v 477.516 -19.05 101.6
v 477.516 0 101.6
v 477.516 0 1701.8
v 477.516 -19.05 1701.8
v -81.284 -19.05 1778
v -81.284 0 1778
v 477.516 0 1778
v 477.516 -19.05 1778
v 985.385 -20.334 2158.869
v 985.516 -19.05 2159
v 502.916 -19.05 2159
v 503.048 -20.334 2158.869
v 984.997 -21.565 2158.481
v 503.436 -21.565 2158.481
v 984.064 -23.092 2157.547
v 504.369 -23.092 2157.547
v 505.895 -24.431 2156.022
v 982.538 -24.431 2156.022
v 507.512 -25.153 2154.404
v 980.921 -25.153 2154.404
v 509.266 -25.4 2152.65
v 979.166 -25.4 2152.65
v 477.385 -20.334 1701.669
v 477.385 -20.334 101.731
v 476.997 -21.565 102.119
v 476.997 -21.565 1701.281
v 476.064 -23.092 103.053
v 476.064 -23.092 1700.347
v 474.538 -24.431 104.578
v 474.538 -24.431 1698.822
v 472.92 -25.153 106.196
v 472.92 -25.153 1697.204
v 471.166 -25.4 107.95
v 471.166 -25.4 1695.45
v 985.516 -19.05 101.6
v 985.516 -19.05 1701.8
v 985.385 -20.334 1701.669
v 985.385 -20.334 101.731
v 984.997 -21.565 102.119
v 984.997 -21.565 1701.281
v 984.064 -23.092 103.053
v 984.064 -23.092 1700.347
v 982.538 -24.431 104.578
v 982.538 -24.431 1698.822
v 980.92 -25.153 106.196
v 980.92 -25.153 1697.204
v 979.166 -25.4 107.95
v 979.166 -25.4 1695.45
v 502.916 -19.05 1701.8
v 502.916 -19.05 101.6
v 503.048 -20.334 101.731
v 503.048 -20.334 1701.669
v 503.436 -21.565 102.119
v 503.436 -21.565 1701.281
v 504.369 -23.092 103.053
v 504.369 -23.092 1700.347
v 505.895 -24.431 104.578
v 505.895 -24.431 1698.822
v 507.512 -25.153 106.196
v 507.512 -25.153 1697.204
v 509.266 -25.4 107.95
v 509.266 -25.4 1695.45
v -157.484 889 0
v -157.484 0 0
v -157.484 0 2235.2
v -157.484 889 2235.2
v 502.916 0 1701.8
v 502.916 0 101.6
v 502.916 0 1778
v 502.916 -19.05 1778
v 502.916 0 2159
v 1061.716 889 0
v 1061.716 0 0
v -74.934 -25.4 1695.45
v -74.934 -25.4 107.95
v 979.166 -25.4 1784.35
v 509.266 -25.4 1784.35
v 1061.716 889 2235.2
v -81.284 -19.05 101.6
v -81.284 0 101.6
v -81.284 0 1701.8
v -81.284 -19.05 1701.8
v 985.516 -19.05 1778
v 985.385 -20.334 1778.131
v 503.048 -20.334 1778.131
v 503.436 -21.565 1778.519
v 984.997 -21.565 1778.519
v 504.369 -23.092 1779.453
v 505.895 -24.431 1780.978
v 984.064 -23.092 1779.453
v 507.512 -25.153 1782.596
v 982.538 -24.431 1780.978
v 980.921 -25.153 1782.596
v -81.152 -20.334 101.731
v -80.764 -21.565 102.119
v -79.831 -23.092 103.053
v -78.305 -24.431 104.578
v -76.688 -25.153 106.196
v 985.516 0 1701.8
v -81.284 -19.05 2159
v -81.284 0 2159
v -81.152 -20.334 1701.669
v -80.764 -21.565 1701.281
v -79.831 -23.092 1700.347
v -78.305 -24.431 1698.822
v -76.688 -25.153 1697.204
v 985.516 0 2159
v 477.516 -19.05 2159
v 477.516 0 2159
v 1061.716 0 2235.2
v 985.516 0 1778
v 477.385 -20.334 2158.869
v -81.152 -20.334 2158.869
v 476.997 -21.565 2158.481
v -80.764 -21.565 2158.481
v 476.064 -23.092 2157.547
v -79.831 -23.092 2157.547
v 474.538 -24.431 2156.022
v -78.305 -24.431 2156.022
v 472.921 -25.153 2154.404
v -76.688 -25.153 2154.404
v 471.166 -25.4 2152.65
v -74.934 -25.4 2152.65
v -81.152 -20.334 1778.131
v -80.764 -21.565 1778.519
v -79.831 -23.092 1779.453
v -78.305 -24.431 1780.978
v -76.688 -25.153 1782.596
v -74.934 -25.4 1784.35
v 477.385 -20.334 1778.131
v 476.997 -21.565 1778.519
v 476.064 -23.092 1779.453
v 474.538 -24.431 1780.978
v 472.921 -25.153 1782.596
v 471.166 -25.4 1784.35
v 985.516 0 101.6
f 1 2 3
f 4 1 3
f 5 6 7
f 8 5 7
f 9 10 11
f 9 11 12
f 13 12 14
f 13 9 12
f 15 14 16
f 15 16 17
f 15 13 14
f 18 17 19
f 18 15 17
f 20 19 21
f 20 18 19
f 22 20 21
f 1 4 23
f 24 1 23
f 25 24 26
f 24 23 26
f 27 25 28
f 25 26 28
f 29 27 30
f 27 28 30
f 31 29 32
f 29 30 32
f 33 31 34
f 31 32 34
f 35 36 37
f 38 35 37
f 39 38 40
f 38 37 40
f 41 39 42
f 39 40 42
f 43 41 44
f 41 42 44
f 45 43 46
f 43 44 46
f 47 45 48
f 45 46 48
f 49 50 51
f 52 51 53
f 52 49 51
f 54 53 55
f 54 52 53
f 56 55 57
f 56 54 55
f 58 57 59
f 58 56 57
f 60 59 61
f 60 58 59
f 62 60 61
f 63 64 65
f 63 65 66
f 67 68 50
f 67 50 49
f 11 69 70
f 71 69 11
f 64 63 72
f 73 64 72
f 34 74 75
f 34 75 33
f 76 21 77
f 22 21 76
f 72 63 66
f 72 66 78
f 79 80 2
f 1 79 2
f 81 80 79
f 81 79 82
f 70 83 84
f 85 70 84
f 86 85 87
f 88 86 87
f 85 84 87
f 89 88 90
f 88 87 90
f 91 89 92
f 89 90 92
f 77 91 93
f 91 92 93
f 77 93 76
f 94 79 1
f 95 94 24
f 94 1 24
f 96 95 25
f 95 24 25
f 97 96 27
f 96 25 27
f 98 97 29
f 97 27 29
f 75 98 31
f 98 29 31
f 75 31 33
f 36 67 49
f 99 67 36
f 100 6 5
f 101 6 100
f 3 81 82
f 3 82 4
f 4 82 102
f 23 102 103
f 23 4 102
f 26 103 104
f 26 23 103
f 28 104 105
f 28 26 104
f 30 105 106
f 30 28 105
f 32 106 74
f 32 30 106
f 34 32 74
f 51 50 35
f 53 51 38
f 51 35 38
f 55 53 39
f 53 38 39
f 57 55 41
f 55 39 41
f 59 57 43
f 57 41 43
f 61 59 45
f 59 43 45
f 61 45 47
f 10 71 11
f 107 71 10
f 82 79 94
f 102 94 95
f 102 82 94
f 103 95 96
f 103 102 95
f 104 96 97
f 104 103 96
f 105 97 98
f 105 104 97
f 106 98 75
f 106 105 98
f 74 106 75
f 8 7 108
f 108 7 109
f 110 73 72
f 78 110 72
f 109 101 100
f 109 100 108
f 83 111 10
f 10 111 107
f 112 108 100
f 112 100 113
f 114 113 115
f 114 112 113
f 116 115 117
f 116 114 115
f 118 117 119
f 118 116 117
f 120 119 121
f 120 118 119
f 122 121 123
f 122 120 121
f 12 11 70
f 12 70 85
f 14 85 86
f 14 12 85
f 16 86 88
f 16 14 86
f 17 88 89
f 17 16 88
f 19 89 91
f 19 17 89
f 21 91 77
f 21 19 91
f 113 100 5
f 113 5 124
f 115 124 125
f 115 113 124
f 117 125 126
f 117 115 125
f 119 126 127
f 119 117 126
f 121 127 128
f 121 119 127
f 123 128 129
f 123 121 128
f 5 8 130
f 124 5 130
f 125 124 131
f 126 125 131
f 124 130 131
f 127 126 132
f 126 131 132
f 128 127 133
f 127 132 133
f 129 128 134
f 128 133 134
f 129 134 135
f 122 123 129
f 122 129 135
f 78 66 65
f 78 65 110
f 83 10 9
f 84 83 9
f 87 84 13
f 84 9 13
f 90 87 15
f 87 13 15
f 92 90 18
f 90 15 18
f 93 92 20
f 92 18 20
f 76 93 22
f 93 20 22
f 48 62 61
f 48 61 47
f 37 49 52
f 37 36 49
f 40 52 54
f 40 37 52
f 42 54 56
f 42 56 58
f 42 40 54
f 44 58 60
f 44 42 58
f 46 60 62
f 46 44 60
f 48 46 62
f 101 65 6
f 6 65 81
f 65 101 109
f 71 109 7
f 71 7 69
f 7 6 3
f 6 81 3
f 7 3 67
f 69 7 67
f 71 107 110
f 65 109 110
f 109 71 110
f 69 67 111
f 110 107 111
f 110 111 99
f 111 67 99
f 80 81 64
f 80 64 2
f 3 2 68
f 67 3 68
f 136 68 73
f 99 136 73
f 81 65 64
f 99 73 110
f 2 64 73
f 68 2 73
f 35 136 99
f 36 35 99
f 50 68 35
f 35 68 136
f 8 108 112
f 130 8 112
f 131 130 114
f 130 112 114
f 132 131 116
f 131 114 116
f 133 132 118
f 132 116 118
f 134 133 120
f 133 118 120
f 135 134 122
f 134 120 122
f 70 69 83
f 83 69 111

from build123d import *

# Parameters (mm, degrees)
F0_W     = 1219.2
F0_H     = 889
F1_DEPTH = 2235.2
F2_W     = 558.8
F2_H     = 1600.2
F2_W_2   = 482.6
F2_H_2   = 381
F3_DEPTH = 25.4
F4_R     = 6.35


with BuildPart() as f1:
    # F0 (on Top) → F1 (new body)
    with BuildSketch(Plane.XY):
        with Locations((452.116386, 444.5)):
            Rectangle(F0_W, F0_H)
    extrude(amount=F1_DEPTH)

    # F2 (on face) → F3 (join)
    with BuildSketch(Plane.XZ):
        with Locations((198.116386, 901.7)):
            Rectangle(F2_W, F2_H)
        with Locations((744.216386, 901.7)):
            Rectangle(F2_W_2, F2_H)
        with Locations((198.116386, 1968.5)):
            Rectangle(F2_W, F2_H_2)
        with Locations((744.216386, 1968.5)):
            Rectangle(F2_W_2, F2_H_2)
    extrude(amount=F3_DEPTH)

    # F4
    f4_edges = [f1.edges().sort_by_distance(p)[0] for p in [
        (502.916386, -25.4, 1968.5),
        (744.216386, -25.4, 1778),
        (985.516386, -25.4, 1968.5),
        (744.216386, -25.4, 2159),
        (477.516386, -25.4, 1968.5),
        (198.116386, -25.4, 2159),
        (-81.283614, -25.4, 1968.5),
        (198.116386, -25.4, 1778),
        (477.516386, -25.4, 901.7),
        (198.116386, -25.4, 1701.8),
        (-81.283614, -25.4, 901.7),
        (198.116386, -25.4, 101.6),
        (985.516386, -25.4, 901.7),
        (744.216386, -25.4, 1701.8),
        (502.916386, -25.4, 901.7),
        (744.216386, -25.4, 101.6),
    ]]
    fillet(f4_edges, radius=F4_R)


solid = f1.part
